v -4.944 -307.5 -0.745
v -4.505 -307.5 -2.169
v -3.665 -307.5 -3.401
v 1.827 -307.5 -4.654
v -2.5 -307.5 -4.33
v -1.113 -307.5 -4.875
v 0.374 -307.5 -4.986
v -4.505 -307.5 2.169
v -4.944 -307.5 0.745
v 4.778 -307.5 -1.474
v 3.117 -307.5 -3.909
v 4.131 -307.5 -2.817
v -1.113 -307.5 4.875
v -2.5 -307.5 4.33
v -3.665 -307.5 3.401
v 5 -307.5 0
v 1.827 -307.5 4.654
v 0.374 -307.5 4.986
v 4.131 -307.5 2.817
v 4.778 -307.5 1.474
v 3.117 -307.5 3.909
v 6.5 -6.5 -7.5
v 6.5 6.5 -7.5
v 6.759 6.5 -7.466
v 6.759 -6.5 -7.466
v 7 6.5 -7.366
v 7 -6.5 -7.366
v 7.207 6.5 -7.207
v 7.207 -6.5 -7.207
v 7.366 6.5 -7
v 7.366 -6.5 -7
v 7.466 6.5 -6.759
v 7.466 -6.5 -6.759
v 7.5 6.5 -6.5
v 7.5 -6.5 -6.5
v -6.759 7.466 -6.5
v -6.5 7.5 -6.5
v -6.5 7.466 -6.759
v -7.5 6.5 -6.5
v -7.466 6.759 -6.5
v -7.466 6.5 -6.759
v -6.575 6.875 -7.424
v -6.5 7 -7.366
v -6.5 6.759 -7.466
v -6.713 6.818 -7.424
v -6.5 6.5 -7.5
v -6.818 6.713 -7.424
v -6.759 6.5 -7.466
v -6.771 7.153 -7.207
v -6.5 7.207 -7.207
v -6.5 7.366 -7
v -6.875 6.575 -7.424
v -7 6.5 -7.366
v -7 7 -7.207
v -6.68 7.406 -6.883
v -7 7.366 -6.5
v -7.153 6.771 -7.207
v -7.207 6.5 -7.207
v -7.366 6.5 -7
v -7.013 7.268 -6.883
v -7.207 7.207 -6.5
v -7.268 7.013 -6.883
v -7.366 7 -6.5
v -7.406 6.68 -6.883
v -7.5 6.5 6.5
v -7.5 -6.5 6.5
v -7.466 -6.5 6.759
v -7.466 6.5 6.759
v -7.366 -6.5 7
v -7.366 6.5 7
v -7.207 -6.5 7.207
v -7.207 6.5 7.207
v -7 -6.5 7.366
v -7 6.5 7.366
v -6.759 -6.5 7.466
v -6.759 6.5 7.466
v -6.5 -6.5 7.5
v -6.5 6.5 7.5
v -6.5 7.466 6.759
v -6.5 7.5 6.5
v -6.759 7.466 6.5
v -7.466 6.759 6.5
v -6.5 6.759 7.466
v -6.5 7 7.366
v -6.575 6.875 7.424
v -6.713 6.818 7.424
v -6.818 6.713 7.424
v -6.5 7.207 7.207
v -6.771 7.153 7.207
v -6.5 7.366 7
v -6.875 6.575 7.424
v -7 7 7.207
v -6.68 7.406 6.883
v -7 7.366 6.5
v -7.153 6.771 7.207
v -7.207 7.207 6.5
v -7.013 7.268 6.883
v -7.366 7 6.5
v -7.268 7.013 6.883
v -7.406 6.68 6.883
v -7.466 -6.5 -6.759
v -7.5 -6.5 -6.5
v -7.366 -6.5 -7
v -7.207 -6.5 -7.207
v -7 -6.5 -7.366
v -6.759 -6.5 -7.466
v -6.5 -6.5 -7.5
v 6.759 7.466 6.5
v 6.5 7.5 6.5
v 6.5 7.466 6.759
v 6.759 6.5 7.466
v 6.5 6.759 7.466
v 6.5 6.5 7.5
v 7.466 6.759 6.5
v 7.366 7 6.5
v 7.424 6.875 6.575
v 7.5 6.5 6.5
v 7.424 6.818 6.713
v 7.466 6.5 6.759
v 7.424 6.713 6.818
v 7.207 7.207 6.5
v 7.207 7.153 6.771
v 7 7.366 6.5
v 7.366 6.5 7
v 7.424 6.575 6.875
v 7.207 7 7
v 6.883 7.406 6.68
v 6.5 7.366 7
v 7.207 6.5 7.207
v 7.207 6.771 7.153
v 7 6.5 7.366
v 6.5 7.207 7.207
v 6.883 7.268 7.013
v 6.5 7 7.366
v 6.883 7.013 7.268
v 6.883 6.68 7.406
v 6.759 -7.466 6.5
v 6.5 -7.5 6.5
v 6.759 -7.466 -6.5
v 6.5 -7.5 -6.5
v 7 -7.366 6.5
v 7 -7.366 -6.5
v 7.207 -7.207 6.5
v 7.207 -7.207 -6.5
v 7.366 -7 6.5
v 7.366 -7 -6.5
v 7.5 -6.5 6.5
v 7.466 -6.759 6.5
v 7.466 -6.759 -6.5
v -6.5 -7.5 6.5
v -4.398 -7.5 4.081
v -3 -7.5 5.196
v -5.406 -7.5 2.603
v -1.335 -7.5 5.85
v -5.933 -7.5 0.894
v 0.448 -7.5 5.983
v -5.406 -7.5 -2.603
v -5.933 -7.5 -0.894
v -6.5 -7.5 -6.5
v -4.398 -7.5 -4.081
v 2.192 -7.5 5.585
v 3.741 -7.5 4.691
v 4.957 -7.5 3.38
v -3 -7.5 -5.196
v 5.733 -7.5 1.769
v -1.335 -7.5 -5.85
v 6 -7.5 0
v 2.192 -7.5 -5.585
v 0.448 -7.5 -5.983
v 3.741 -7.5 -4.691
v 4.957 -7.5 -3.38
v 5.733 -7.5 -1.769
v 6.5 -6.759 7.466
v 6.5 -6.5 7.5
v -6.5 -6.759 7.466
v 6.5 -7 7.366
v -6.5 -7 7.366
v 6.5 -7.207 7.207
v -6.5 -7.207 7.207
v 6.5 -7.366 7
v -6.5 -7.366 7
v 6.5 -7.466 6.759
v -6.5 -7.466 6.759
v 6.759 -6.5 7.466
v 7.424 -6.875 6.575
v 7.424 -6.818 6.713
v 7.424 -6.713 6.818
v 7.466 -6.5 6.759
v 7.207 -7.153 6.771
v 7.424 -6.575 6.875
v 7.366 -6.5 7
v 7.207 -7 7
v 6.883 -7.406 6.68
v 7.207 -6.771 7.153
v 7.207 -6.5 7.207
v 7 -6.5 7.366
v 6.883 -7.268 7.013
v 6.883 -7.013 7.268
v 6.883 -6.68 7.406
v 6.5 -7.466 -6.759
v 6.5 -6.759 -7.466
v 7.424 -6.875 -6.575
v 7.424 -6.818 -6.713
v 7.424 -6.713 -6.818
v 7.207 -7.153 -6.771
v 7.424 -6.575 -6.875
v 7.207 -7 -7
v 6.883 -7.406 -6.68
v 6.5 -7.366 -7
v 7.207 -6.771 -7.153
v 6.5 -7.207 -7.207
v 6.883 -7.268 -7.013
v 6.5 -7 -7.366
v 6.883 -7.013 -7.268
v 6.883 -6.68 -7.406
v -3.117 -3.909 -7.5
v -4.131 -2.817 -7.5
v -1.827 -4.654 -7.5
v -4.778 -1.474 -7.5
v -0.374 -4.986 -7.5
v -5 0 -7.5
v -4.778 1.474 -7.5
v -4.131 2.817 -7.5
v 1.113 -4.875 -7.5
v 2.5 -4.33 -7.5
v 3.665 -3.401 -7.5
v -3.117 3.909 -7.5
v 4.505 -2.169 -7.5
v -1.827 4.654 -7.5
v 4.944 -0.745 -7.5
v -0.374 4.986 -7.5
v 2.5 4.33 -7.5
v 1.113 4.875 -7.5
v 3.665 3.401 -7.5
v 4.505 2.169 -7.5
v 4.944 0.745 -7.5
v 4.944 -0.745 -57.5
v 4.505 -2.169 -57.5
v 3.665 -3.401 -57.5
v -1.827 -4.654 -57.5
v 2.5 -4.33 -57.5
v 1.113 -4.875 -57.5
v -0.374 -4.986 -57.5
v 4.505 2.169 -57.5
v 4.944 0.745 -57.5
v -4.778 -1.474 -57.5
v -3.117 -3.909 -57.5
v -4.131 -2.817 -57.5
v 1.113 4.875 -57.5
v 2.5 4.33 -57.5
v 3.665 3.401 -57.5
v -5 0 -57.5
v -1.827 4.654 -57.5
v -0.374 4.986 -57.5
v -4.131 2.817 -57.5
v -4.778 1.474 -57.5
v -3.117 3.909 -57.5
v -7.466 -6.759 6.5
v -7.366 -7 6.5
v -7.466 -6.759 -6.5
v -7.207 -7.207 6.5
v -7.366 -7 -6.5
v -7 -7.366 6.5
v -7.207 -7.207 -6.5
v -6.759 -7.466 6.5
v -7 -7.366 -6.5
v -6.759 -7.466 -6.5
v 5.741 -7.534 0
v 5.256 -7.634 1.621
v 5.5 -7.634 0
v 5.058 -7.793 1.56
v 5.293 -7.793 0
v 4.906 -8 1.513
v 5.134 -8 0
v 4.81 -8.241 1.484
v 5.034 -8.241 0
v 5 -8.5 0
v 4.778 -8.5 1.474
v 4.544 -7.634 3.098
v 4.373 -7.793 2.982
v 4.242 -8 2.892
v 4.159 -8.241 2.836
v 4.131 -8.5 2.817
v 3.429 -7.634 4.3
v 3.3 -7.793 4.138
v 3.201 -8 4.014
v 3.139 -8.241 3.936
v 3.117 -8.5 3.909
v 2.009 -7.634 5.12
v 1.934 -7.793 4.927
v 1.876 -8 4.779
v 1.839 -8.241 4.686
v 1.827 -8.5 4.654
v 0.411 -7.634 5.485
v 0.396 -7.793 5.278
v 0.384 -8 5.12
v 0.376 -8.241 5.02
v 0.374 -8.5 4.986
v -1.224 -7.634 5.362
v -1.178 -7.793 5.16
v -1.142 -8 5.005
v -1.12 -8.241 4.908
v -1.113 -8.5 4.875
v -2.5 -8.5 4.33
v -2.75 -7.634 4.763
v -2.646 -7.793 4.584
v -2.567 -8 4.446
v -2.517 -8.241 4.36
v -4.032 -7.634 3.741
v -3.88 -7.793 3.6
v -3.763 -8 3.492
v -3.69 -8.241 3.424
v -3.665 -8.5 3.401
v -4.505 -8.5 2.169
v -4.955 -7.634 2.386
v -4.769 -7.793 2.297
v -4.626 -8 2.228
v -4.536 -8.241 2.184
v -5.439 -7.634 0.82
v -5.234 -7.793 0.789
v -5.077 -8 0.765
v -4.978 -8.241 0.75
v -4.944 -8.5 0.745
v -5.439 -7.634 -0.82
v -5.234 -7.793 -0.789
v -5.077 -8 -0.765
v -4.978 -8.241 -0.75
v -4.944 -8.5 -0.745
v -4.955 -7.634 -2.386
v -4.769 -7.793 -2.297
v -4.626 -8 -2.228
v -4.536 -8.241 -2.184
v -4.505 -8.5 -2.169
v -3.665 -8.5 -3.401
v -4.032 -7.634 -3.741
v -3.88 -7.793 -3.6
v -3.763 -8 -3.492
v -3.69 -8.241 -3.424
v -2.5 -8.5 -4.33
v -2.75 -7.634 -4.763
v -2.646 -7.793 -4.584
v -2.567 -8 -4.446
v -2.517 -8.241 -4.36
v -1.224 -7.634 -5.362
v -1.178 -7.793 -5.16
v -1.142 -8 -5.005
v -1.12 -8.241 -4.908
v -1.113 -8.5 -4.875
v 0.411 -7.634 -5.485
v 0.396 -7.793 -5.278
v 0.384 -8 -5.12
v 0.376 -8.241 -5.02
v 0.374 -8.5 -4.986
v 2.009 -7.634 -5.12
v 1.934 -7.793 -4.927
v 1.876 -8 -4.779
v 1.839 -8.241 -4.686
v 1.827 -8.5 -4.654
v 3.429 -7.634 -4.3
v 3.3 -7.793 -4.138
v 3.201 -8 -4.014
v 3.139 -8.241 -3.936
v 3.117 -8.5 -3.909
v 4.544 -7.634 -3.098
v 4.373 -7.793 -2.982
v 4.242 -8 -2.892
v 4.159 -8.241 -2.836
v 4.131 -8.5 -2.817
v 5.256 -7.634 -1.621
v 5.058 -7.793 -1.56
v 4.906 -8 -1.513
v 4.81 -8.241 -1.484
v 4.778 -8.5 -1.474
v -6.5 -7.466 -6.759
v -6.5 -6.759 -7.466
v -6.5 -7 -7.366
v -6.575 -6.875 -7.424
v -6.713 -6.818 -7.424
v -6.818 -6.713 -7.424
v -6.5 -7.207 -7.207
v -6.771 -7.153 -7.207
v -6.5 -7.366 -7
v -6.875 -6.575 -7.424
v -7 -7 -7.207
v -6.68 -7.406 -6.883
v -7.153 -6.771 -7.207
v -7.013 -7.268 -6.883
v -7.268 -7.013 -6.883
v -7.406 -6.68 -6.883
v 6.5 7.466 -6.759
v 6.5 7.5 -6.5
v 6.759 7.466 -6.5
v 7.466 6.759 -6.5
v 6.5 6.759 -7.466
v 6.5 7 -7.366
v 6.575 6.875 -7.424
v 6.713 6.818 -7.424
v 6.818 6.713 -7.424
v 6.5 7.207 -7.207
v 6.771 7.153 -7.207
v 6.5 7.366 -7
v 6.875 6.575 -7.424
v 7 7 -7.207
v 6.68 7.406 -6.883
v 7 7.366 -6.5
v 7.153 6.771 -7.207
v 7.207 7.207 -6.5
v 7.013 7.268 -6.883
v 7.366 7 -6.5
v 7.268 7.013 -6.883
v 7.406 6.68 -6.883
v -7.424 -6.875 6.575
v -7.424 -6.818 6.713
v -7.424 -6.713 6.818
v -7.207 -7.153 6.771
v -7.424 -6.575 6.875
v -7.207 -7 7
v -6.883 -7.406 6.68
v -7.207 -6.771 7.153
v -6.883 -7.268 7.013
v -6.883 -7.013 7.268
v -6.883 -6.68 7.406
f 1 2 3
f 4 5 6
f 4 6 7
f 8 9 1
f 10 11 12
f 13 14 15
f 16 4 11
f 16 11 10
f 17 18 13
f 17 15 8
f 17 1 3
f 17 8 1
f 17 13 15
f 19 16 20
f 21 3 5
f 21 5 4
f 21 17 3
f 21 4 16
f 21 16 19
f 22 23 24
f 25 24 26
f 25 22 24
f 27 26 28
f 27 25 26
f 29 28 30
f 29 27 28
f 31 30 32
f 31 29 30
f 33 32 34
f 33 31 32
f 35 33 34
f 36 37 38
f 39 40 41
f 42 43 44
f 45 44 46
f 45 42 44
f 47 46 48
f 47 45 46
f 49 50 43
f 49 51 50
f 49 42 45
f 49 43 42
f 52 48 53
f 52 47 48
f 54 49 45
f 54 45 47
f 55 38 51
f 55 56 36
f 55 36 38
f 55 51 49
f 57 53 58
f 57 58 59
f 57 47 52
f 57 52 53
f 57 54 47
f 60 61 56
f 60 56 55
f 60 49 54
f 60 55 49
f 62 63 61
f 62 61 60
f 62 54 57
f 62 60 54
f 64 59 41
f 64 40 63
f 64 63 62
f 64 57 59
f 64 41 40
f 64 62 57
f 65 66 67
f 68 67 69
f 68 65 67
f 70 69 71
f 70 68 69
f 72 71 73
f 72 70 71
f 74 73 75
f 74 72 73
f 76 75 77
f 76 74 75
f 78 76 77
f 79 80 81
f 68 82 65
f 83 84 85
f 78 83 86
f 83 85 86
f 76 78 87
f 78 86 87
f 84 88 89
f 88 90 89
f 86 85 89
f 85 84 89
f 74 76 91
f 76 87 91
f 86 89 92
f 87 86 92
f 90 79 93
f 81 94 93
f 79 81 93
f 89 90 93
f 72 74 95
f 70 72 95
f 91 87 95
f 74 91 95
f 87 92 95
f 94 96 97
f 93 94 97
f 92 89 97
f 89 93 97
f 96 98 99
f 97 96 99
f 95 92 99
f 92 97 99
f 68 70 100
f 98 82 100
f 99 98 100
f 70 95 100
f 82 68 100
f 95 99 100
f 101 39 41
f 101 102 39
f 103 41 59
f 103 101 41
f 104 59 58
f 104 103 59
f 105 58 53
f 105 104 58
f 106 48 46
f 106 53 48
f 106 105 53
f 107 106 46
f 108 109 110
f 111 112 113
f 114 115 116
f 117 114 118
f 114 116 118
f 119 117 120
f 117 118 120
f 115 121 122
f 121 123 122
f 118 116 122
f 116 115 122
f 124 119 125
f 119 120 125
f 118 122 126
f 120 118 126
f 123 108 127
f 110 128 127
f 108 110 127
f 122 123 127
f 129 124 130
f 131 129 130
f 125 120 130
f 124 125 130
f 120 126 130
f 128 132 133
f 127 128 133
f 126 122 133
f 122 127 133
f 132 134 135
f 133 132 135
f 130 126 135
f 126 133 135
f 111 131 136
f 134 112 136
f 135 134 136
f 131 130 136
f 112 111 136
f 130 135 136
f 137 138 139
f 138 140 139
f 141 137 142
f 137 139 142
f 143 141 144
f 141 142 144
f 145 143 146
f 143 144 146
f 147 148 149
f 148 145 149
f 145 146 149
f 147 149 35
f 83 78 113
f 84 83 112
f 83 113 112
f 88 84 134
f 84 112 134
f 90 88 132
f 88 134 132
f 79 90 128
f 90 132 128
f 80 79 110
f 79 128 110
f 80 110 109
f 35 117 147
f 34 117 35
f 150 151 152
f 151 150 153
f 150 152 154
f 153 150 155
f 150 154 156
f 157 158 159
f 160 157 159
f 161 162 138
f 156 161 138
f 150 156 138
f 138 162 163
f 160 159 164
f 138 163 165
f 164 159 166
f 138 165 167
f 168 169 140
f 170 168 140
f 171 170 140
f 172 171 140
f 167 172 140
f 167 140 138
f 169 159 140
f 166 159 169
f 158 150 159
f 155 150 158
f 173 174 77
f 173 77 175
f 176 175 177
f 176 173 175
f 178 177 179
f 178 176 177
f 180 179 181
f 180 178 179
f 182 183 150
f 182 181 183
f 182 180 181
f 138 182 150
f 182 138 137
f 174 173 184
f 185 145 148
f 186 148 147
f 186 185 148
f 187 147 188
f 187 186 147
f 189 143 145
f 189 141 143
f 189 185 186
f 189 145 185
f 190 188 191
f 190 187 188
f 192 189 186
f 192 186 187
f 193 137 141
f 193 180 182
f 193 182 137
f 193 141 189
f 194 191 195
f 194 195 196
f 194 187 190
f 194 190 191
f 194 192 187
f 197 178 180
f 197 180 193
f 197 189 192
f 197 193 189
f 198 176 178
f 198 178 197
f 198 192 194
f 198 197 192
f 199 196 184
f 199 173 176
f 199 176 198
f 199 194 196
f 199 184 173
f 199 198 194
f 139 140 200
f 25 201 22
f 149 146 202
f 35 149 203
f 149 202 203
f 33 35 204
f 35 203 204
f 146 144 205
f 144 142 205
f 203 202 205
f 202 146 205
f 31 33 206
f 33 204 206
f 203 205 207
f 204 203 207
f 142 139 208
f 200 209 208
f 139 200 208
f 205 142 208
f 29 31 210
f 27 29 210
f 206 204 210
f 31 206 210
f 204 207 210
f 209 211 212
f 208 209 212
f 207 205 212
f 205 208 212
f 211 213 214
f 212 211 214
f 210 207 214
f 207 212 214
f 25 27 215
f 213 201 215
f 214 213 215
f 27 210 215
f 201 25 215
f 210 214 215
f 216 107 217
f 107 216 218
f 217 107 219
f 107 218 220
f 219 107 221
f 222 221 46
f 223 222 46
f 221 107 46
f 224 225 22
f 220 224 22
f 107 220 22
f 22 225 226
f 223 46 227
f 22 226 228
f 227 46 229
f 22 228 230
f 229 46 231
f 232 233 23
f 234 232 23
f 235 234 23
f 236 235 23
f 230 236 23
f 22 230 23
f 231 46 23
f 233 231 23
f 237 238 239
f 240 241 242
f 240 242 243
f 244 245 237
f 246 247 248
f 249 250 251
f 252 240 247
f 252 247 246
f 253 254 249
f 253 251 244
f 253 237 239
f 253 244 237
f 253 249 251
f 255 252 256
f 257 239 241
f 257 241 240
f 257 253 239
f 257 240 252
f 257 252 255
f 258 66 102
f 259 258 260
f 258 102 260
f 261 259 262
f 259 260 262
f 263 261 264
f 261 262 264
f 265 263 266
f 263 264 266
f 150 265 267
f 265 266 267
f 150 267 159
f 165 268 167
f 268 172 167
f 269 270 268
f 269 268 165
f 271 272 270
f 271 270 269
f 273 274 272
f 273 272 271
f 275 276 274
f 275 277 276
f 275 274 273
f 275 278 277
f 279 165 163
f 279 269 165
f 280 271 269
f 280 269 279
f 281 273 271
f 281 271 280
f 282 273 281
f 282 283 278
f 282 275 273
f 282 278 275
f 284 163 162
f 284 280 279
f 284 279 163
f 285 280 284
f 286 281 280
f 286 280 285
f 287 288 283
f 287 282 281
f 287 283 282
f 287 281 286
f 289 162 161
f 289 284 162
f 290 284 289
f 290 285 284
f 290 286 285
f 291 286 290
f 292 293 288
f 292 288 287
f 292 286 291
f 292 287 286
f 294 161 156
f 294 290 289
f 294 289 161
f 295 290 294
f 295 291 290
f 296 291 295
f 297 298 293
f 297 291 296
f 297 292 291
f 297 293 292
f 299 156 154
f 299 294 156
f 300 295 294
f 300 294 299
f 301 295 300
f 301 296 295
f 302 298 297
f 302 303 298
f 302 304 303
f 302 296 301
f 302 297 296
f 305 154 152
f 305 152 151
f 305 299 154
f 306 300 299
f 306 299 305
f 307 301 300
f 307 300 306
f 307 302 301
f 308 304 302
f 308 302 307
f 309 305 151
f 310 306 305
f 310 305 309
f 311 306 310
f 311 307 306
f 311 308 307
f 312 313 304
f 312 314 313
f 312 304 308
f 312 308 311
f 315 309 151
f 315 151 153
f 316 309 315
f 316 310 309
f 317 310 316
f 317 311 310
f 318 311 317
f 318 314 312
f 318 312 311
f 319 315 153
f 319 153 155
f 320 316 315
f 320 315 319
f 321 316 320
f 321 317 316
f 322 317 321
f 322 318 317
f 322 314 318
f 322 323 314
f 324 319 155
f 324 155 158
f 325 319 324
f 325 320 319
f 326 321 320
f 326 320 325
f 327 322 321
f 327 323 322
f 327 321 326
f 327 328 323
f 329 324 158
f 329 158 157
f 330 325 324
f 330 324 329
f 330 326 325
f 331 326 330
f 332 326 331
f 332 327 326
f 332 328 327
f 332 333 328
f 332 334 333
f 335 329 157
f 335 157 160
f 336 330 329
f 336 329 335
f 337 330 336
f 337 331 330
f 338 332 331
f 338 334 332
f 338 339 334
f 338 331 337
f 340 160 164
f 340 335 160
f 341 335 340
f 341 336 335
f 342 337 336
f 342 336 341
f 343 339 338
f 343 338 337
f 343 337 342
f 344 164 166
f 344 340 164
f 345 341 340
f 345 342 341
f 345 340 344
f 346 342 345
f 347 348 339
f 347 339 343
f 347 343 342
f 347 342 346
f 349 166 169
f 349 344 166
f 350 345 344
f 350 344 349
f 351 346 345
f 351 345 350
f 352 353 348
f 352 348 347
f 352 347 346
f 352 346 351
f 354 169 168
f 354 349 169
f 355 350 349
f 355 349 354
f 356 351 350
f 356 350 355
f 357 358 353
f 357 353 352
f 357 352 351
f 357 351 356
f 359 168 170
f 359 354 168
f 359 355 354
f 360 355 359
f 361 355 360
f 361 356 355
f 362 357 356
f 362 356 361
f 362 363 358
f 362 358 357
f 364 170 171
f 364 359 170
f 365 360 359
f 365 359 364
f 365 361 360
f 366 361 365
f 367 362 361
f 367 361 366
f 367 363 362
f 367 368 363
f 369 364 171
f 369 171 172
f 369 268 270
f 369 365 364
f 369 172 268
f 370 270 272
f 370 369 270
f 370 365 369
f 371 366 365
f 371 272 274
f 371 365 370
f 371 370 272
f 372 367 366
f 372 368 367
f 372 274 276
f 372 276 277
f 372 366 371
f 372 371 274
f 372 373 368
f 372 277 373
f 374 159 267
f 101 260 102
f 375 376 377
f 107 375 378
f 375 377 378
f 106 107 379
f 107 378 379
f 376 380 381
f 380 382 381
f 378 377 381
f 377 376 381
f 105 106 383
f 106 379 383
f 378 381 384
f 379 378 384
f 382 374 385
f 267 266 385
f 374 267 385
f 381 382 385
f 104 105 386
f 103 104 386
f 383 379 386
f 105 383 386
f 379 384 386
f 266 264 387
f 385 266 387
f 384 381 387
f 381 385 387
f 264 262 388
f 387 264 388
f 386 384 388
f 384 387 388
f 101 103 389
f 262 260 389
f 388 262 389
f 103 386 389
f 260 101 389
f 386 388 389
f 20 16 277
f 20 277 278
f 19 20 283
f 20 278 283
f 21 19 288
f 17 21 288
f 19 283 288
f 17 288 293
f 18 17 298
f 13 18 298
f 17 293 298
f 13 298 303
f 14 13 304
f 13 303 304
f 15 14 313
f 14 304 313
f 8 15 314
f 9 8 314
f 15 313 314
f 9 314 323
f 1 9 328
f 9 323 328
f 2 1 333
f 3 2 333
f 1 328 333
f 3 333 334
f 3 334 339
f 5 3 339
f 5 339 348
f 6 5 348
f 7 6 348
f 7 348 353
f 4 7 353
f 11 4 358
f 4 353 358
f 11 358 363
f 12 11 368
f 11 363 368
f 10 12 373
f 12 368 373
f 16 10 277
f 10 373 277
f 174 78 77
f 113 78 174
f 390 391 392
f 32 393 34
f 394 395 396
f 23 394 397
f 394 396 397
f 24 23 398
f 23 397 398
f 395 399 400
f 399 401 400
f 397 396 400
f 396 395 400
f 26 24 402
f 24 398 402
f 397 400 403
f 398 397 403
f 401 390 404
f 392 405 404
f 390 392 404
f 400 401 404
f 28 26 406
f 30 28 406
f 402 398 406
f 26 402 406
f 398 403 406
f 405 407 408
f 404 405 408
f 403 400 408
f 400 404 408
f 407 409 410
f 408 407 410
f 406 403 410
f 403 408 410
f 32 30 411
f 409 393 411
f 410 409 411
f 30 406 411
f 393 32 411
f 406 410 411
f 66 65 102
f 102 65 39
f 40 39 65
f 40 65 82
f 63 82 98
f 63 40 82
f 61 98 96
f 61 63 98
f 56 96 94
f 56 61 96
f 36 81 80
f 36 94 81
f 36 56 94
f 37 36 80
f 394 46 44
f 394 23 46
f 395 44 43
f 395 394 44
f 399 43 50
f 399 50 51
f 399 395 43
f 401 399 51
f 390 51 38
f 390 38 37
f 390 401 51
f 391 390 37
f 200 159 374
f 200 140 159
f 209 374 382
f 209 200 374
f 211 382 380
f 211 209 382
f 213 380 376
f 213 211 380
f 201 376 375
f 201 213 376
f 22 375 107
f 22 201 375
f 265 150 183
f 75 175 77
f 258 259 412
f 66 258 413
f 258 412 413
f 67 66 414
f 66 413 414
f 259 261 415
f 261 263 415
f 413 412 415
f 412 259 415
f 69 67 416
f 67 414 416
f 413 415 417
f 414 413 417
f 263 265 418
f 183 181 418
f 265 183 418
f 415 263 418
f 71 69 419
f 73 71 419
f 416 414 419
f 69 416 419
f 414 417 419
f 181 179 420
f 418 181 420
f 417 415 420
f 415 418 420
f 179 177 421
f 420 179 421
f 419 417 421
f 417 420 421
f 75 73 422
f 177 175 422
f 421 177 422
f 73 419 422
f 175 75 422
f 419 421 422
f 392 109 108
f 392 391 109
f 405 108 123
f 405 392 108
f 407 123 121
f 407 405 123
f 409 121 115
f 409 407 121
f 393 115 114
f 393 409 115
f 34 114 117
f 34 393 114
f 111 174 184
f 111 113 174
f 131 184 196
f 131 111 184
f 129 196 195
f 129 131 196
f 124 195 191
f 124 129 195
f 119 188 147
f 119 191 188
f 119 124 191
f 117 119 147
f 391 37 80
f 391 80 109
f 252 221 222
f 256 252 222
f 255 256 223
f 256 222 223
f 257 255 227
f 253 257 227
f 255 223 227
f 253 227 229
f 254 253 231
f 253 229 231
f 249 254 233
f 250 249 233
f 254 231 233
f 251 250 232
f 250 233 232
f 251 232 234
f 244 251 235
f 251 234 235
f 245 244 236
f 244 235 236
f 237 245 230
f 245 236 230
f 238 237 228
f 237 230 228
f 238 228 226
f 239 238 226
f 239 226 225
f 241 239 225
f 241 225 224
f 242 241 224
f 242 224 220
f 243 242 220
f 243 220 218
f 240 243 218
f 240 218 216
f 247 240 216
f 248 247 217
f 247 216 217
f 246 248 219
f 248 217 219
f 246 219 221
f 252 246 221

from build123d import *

# Parameters (mm, degrees)
SKETCH1_W           = 15
SKETCH1_H           = 15
BOSS_EXTRUDE1_DEPTH = 7.5
SKETCH2_R           = 5
BOSS_EXTRUDE2_DEPTH = 50
SKETCH3_R           = 5
BOSS_EXTRUDE3_DEPTH = 300
FILLET1_R           = 1


with BuildPart() as part:
    # Sketch1 → Boss-Extrude1 (new body, symmetric)
    with BuildSketch(Plane(origin=(0, 0, 0), x_dir=(1, 0, 0), z_dir=(0, 1, 0))):
        Rectangle(SKETCH1_W, SKETCH1_H)
    extrude(amount=BOSS_EXTRUDE1_DEPTH, both=True)

    # Sketch2 → Boss-Extrude2 (add)
    with BuildSketch(Plane(origin=(0, 0, -7.5), x_dir=(-1, 0, 0), z_dir=(0, 0, -1))):
        Circle(SKETCH2_R)
    extrude(amount=BOSS_EXTRUDE2_DEPTH)

    # Sketch3 → Boss-Extrude3 (add)
    with BuildSketch(Plane.XZ.offset(7.5)):
        Circle(SKETCH3_R)
    extrude(amount=BOSS_EXTRUDE3_DEPTH)

    # Fillet1
    fillet1_edges = [part.edges().sort_by_distance(p)[0] for p in [
        (-7.5, 7.5, 0),
        (0, 7.5, 7.5),
        (-5, -7.5, 0),
        (7.5, 7.5, 0),
        (0, -7.5, 7.5),
        (-7.5, -7.5, 0),
        (0, -7.5, -7.5),
        (7.5, -7.5, 0),
        (0, 7.5, -7.5),
        (7.5, 0, 7.5),
        (-7.5, 0, 7.5),
        (-7.5, 0, -7.5),
        (7.5, 0, -7.5),
    ]]
    fillet(fillet1_edges, radius=FILLET1_R)


solid = part.part
